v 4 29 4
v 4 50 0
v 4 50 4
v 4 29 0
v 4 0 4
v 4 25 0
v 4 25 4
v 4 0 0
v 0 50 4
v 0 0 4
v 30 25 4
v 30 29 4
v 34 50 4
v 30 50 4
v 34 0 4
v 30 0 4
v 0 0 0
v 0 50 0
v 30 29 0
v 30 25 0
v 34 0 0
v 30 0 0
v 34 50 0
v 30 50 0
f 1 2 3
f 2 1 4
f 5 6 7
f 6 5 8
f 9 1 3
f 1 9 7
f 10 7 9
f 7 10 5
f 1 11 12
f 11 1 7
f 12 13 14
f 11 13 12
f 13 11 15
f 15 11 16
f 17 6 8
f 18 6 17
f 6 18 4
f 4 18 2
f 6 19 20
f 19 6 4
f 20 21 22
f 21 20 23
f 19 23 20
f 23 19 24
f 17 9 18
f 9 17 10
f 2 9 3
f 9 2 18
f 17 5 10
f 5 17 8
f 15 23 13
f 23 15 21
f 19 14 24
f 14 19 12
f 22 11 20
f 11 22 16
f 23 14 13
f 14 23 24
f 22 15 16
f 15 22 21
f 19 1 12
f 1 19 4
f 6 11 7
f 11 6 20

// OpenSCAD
//буква h
module H(x=3, y=40, z=3 ){
 union(){
 cube([x,y,z]);
 translate([x1,0,0]) cube([x,y,z]);
 translate([0,z2,0]) cube([x1,z,x]);
}
}
 H(x=4, y=50, z=4 ,z2=25, x1=30);
